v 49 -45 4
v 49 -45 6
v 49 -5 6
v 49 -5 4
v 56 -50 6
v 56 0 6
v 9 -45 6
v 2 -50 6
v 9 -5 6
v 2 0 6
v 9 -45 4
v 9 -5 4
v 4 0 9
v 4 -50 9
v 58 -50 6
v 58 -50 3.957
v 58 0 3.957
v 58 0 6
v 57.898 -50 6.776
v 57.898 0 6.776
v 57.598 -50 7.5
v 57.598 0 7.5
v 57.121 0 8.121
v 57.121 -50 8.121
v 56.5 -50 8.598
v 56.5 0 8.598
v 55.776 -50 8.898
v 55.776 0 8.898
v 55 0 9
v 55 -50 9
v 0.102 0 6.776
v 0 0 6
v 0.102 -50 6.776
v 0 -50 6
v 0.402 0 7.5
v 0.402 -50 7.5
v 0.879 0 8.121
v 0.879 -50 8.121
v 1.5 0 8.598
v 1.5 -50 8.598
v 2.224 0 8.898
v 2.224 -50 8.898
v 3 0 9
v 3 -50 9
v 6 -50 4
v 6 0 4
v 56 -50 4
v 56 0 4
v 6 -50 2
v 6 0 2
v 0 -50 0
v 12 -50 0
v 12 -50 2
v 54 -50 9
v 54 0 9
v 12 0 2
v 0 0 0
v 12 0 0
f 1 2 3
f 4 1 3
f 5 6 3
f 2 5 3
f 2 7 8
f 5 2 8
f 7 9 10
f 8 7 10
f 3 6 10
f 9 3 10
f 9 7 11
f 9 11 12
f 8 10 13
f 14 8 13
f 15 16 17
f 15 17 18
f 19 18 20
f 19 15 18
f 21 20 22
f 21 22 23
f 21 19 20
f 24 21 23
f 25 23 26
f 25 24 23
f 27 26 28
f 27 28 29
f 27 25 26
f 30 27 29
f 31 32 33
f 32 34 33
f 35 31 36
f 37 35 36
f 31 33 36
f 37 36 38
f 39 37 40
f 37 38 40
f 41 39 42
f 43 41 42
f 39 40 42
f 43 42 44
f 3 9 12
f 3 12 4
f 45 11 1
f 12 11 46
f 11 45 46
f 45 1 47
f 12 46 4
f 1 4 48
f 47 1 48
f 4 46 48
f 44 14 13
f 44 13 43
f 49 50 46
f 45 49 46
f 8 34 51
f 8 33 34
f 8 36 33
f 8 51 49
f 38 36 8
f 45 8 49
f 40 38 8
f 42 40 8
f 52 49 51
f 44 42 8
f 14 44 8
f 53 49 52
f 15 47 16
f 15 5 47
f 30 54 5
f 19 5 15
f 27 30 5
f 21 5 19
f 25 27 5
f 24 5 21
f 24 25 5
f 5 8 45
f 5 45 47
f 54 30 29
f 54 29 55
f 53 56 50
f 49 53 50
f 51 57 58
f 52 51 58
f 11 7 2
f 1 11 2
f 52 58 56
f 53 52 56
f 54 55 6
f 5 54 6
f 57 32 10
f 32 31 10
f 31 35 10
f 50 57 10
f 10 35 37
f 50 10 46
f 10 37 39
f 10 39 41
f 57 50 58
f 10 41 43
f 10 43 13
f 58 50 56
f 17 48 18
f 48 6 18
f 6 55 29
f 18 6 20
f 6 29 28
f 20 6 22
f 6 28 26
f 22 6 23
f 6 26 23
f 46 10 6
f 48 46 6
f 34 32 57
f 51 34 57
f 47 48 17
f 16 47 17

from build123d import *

# Parameters (mm, degrees)
F1_DEPTH = 50
F2_R     = 3
F3_W     = 40
F3_H     = 40
F4_DEPTH = 2


with BuildPart() as f1:
    # F0 (on Front) → F1 (new body)
    with BuildSketch(Plane.XZ):
        Polygon((0, 9), (0, 6), (2, 6), (4, 9), align=None)
        Polygon((2, 6), (0, 6), (0, 0), (12, 0), (12, 2), (6, 2), (6, 4), (56, 4), (58, 3.95681), (58, 6), (56, 6), align=None)
        Polygon((54, 9), (56, 6), (58, 6), (58, 9), align=None)
    extrude(amount=F1_DEPTH)

    # F2
    f2_edges = [f1.edges().sort_by_distance(p)[0] for p in [
        (0, -25, 9),
        (58, -25, 9),
    ]]
    fillet(f2_edges, radius=F2_R)

    # F3 (on face) → F4 (cut)
    with BuildSketch(Plane.XY.offset(6)):
        with Locations((29, -25)):
            Rectangle(F3_W, F3_H)
    extrude(amount=-F4_DEPTH, mode=Mode.SUBTRACT)


solid = f1.part
